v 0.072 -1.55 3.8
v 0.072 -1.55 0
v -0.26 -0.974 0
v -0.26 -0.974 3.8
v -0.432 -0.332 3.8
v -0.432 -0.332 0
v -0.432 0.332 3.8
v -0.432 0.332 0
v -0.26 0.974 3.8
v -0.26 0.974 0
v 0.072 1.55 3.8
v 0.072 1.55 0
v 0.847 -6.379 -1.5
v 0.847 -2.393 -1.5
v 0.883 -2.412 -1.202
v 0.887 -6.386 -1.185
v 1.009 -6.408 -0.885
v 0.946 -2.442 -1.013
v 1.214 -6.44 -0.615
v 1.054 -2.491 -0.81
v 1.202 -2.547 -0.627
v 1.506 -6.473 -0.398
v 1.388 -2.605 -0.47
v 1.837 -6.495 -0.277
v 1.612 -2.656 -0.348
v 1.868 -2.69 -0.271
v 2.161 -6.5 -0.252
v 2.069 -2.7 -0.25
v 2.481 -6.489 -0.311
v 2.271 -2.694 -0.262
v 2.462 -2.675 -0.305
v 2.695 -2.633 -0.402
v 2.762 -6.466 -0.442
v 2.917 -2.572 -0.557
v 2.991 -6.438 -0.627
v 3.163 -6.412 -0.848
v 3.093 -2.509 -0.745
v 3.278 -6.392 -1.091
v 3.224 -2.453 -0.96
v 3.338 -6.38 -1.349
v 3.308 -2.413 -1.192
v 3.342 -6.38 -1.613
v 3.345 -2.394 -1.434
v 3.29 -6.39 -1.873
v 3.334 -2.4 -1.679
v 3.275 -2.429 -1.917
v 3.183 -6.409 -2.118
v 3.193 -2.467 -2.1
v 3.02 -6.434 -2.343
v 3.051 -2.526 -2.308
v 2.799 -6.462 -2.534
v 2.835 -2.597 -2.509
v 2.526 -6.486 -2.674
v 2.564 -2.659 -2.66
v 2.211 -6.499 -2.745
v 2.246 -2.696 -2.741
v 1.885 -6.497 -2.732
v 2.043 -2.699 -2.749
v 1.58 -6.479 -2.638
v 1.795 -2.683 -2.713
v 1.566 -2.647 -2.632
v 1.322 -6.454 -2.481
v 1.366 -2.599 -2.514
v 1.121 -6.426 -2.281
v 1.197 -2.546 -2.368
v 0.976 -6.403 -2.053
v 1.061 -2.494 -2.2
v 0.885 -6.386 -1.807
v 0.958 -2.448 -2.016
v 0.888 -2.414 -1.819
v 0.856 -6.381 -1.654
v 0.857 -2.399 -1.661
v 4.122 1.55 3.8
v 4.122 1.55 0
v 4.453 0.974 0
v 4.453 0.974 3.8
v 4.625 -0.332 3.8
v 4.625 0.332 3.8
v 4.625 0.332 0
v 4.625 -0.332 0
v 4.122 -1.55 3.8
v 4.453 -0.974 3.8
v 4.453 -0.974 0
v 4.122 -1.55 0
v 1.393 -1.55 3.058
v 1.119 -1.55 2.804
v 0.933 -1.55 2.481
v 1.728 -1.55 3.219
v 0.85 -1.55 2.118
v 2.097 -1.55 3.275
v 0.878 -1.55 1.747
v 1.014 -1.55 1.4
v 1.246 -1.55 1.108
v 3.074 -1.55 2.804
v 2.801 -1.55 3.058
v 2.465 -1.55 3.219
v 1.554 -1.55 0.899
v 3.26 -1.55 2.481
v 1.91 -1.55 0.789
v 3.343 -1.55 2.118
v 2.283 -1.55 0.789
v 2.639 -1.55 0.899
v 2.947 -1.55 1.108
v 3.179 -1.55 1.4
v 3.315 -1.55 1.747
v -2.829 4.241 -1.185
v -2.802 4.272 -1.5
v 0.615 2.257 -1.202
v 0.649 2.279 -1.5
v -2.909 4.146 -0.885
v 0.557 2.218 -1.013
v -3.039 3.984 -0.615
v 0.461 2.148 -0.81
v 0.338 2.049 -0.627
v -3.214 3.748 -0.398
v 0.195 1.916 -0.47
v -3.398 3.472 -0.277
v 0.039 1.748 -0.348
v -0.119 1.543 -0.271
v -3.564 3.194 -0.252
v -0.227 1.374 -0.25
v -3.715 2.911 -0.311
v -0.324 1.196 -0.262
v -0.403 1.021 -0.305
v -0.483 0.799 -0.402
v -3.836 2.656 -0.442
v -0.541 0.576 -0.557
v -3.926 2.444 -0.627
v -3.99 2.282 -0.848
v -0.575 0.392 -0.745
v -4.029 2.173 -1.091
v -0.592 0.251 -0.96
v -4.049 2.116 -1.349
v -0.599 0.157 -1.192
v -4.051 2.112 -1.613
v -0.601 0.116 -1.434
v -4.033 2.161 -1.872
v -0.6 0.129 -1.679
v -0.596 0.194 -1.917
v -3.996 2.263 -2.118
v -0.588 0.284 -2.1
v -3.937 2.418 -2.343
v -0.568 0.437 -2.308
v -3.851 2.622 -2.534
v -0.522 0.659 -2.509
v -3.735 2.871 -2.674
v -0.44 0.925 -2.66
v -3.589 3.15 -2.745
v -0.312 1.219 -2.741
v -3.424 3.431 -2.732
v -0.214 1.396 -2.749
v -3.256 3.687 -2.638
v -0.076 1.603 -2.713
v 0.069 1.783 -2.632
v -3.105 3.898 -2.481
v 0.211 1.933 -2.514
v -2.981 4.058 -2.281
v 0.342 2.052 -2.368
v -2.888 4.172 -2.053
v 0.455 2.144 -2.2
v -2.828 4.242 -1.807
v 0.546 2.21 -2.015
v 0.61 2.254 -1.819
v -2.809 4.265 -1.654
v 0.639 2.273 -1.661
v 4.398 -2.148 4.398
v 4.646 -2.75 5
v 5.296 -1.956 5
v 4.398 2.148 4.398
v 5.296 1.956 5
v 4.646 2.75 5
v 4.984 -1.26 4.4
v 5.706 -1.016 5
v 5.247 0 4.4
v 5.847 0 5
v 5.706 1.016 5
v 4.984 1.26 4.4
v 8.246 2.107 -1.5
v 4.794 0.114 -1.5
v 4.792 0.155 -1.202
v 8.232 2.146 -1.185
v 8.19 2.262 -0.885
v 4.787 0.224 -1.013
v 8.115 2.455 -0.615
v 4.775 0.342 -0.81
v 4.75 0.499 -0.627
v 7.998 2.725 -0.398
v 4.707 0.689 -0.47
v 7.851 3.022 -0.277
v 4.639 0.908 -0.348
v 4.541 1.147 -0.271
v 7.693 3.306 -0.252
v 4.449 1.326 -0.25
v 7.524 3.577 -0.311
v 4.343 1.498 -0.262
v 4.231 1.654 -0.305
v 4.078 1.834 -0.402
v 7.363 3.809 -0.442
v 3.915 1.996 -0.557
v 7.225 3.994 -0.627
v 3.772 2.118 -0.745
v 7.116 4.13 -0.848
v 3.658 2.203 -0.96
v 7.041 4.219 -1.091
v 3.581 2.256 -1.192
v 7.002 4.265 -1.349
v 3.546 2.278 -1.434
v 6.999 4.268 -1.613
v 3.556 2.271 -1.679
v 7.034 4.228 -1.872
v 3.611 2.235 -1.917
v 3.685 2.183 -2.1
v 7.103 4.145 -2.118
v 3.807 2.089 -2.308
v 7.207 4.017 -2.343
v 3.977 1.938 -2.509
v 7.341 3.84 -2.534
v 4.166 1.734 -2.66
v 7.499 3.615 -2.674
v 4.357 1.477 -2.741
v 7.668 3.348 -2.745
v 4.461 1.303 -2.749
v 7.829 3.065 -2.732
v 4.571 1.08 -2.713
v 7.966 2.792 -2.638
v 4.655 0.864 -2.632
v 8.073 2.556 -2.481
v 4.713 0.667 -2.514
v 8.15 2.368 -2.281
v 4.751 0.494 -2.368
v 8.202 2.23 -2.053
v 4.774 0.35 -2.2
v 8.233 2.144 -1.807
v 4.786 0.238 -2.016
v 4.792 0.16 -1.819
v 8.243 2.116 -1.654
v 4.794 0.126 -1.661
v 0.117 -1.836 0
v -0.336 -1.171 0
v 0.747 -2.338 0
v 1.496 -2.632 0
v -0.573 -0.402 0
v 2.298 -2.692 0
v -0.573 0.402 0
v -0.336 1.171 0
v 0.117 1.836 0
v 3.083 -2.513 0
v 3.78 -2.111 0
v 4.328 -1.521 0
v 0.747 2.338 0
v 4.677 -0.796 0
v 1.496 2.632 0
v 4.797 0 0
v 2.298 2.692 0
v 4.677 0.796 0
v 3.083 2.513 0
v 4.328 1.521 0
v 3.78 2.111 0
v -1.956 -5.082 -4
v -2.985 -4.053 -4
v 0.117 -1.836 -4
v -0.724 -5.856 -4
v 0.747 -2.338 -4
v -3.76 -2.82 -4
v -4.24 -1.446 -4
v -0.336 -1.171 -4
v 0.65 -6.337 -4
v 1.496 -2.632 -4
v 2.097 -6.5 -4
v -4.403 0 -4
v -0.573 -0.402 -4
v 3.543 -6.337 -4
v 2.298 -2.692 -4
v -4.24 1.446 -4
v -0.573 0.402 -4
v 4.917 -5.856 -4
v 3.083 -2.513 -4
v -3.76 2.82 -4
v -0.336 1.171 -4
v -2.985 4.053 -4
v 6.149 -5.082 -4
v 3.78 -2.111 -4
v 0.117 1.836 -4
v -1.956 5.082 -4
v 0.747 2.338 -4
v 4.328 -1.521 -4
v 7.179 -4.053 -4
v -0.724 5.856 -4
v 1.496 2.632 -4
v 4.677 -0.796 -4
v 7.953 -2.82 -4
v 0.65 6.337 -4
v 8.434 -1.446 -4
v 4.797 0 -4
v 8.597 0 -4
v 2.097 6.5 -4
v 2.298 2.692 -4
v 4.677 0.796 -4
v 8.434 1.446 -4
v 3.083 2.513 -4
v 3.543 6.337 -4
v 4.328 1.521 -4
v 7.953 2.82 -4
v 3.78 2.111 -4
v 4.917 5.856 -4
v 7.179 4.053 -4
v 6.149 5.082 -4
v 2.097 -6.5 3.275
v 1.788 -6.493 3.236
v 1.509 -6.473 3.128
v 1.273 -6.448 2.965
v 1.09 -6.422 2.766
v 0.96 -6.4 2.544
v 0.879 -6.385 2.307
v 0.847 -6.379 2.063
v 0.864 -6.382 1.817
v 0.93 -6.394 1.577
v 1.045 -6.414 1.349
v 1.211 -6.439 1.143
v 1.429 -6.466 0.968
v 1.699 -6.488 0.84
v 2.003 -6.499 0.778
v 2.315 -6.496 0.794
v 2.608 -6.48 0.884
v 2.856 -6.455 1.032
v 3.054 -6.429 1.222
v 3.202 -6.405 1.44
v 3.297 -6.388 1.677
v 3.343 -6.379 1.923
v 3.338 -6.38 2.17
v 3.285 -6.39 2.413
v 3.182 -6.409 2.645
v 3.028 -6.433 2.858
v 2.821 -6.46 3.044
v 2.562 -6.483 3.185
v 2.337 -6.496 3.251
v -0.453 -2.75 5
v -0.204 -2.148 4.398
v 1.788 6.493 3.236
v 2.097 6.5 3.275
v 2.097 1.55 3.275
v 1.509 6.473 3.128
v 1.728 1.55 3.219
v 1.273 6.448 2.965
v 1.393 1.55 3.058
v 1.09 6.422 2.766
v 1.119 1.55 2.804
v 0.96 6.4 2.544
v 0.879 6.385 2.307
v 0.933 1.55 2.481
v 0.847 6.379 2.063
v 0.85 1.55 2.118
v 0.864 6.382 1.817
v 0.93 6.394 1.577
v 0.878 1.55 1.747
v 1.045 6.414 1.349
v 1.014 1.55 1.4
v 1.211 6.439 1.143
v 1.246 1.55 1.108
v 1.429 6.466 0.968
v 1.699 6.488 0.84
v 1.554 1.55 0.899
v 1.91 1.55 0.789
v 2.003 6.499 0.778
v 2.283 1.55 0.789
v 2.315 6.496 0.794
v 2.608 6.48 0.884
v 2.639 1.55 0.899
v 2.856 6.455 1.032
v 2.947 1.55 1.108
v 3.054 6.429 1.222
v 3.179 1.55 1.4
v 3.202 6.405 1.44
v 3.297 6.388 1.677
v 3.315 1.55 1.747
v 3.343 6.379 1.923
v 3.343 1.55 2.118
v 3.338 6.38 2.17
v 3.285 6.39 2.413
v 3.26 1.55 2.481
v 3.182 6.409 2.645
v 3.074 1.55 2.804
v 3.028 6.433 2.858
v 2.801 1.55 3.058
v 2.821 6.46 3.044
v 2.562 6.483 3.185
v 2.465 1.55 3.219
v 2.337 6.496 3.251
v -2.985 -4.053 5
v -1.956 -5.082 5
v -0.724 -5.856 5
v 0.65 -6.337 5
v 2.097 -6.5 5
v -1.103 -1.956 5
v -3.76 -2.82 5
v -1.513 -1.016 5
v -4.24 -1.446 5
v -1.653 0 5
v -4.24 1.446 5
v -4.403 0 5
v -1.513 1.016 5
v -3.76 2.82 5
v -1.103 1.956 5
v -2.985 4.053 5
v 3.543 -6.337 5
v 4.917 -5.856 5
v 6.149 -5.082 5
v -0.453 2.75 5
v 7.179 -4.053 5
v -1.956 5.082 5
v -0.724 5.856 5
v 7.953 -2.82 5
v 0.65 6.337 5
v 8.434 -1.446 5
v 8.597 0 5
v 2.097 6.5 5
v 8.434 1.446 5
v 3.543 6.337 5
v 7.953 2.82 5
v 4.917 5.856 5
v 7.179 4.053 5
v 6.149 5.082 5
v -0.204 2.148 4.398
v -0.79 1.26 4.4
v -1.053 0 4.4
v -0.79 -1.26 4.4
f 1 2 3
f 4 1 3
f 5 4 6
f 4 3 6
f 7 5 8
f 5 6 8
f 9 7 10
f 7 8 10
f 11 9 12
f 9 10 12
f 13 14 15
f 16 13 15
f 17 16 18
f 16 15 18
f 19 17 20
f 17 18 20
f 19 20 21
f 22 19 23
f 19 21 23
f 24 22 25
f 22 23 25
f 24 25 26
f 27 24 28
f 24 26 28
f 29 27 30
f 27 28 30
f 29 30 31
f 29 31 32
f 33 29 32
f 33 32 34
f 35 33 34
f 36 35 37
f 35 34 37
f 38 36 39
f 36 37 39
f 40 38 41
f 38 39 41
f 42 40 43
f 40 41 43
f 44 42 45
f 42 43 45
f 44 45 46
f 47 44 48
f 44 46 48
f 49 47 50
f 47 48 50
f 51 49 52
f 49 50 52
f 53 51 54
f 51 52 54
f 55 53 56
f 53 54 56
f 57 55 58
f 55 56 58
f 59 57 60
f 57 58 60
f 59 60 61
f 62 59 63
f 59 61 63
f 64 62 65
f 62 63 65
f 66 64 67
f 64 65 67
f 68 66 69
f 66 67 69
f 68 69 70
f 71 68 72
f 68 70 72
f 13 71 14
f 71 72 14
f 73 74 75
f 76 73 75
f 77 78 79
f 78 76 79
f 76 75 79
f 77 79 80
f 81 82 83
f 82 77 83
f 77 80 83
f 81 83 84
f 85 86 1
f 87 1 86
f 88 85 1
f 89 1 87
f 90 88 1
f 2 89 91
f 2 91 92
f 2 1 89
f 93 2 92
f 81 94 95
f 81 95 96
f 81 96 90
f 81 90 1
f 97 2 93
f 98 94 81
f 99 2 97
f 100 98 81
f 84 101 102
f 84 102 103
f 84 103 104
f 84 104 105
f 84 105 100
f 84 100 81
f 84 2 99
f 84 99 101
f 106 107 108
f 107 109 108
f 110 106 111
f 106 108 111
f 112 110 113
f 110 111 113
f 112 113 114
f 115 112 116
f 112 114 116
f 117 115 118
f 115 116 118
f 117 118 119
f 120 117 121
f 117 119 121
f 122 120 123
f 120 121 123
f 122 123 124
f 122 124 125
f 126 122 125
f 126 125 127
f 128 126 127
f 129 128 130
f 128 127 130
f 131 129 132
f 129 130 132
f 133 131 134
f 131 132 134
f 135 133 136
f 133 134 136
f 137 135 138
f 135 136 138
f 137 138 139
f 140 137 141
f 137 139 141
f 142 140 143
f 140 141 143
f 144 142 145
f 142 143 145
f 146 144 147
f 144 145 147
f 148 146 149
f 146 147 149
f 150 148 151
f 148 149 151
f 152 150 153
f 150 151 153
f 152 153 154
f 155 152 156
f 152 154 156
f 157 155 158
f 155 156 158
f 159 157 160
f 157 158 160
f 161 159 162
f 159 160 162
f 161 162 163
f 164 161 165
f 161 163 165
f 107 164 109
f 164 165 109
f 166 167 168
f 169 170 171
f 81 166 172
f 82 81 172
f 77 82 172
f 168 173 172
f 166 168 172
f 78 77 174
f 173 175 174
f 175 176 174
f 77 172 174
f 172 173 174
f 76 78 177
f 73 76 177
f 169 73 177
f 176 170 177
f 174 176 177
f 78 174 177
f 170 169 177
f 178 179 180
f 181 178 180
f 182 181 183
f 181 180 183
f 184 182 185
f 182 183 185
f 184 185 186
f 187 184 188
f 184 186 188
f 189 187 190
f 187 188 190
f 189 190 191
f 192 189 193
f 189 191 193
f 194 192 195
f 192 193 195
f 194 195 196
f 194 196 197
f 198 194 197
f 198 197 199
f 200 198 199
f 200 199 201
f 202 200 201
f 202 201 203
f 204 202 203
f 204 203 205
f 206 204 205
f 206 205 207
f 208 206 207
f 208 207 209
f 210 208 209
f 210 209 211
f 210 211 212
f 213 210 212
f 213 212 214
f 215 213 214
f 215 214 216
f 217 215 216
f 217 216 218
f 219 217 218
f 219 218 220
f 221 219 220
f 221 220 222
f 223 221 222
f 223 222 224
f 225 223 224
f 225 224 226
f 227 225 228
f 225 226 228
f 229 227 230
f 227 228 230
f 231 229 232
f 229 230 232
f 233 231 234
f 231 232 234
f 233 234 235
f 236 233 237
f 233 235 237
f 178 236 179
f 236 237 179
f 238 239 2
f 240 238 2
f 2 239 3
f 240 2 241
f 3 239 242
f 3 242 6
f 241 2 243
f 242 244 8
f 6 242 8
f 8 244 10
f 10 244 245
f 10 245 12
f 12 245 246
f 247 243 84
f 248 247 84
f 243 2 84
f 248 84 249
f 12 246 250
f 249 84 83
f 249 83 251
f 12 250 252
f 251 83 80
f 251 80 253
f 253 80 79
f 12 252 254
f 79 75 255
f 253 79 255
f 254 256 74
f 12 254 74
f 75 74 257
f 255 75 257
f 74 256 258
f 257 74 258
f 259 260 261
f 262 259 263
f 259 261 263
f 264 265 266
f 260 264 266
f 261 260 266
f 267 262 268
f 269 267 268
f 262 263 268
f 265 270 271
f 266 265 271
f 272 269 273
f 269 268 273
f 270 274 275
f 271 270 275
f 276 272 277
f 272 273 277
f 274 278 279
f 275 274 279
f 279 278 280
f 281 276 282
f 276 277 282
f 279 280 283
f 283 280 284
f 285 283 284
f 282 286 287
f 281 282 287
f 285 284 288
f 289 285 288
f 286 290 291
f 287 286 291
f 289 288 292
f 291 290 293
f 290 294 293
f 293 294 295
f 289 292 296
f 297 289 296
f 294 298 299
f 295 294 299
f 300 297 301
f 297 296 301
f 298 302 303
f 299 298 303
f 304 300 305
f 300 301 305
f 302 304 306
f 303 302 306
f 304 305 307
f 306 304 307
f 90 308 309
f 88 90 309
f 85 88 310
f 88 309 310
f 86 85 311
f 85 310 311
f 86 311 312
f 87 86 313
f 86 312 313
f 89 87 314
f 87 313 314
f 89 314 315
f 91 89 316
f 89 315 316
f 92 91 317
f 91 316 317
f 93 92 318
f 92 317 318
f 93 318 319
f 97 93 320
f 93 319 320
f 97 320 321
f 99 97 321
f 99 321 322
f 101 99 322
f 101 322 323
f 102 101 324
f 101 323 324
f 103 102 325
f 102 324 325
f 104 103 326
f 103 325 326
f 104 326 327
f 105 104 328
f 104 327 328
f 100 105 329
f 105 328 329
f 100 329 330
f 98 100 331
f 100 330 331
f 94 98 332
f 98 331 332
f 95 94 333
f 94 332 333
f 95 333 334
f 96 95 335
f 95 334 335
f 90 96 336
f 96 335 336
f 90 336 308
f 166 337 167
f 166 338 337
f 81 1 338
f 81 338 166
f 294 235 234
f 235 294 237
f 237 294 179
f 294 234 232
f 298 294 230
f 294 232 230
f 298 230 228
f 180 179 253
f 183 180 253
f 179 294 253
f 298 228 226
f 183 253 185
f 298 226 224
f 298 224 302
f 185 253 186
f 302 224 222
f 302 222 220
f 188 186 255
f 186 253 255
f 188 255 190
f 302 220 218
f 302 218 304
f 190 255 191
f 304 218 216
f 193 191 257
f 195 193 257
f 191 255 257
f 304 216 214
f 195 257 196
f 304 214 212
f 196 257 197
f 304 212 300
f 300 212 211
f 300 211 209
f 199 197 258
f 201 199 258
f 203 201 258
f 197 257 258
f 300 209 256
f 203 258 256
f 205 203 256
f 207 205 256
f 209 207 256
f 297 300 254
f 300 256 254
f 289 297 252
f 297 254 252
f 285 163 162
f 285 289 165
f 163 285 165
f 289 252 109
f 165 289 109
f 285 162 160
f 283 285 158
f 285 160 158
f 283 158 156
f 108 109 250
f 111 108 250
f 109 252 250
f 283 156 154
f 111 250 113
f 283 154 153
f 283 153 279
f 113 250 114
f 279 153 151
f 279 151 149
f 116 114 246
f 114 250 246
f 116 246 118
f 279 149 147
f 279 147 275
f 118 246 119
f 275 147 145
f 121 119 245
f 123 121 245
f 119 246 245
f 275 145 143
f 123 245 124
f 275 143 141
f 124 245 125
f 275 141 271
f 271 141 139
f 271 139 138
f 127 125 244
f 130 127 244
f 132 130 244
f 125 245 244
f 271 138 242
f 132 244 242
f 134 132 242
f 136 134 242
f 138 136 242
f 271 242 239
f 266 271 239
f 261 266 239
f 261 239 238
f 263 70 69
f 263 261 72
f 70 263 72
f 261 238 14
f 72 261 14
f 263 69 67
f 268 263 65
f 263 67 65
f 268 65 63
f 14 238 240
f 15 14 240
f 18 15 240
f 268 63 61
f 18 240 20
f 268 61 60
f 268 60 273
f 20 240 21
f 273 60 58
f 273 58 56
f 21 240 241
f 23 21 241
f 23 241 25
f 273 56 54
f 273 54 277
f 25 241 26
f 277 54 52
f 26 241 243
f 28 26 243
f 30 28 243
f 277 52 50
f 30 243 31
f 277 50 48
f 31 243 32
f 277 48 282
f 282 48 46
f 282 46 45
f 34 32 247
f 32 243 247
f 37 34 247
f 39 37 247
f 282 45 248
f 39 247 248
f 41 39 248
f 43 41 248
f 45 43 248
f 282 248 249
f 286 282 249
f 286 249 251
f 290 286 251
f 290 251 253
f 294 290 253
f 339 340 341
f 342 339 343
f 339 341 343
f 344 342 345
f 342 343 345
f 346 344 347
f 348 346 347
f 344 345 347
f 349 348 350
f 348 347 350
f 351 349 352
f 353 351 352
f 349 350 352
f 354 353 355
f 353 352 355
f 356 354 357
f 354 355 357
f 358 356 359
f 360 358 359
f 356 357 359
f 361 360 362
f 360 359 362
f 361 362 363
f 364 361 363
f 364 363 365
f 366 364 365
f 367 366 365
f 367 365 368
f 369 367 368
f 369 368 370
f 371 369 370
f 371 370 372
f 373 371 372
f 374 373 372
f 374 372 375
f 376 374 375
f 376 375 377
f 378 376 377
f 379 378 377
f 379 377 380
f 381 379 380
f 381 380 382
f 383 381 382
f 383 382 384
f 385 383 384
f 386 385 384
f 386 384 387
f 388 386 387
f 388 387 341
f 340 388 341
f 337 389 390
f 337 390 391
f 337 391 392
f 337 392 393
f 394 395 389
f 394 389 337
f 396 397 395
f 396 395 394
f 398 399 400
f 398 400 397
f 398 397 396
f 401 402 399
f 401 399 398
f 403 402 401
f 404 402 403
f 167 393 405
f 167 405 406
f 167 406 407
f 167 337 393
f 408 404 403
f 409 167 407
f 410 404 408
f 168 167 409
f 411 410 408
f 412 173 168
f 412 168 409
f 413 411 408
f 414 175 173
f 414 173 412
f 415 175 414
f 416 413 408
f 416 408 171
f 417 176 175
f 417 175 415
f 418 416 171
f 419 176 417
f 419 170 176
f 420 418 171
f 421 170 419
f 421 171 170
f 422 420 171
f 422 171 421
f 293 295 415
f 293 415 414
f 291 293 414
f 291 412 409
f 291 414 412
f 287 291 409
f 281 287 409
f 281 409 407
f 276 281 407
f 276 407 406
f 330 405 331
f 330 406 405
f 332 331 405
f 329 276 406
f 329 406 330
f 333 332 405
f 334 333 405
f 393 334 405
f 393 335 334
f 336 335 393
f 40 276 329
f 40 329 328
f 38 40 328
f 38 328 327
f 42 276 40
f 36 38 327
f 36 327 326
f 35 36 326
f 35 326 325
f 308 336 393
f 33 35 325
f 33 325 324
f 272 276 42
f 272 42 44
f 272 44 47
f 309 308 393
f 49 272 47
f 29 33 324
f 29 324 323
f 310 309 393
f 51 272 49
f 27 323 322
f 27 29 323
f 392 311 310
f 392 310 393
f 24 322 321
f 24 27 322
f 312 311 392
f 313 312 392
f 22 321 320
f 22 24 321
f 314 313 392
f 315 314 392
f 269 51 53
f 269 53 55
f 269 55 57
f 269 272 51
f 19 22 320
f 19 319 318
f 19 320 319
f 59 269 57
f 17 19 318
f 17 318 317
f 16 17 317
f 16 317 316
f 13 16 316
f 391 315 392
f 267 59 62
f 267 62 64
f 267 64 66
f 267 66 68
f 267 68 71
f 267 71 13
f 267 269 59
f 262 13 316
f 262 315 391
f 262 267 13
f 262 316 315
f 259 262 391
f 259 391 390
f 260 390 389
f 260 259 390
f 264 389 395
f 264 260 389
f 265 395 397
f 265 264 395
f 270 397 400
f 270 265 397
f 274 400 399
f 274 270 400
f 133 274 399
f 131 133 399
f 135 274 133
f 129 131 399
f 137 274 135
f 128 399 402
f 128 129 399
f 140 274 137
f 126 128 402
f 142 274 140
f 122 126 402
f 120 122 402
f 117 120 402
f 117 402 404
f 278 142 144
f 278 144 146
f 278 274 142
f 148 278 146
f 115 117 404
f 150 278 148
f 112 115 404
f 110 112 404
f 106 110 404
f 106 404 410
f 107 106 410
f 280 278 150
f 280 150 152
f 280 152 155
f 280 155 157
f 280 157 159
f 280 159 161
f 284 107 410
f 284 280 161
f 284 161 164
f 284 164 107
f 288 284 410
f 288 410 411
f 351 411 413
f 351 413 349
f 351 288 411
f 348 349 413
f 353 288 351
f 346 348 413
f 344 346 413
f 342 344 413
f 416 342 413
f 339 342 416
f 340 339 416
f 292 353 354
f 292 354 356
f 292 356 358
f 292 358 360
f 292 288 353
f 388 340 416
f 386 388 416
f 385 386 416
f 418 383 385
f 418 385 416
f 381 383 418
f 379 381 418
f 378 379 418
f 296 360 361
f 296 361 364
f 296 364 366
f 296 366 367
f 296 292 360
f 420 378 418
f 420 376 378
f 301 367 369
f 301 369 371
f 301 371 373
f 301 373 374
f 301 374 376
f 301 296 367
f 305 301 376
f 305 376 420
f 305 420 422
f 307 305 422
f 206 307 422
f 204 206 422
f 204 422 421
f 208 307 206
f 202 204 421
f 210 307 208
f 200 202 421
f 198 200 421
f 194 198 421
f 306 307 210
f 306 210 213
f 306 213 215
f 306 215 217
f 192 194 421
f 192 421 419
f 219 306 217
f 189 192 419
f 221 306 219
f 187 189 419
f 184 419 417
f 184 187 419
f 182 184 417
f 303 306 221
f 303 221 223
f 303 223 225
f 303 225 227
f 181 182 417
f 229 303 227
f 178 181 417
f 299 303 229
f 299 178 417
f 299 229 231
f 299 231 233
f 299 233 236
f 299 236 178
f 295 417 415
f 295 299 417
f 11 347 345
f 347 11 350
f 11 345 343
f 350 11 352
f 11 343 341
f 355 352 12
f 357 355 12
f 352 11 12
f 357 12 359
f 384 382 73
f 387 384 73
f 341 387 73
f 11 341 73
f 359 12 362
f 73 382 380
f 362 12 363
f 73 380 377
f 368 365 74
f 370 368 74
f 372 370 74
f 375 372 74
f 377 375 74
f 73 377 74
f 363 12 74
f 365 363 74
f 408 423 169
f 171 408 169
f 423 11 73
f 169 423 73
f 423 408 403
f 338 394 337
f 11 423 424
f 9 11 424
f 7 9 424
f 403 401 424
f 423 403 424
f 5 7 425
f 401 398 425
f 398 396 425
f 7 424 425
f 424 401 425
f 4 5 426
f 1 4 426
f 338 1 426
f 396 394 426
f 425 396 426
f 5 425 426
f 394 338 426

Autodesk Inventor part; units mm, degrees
ref_plane "YZ Plane" through (0, 0, 0) normal (1, 0, 0) x (0, 1, 0)
ref_plane "XZ Plane" through (0, 0, 0) normal (0, 1, 0) x (-1, 0, 0)
sketch "Sketch1" plane through (0, 0, 0) normal (0, 0, 1) x (1, 0, 0)
  line L0 (0.8467, -0.7217) -> (0.8467, 0.7217) construction
  line L1 (0.8467, 0.7217) -> (2.0967, 1.4434) construction
  line L2 (2.0967, 1.4434) -> (3.3467, 0.7217) construction
  line L3 (3.3467, 0.7217) -> (3.3467, -0.7217) construction
  line L4 (3.3467, -0.7217) -> (2.0967, -1.4434) construction
  line L5 (2.0967, -1.4434) -> (0.8467, -0.7217) construction
  circle A0 centre (2.0967, 0) radius 2.45 construction
  line L6 (4.8467, -1.5877) -> (3.4717, -2.3816) construction
  line L7 (15.0967, 3) -> (15.0967, -3) construction
  line L8 (-10.9033, 3) -> (-10.9033, -3) construction
  line L9 (-0.6533, 0) -> (-0.6533, 1.5877) construction
  circle A1 centre (2.0967, 0) radius 5
  circle A2 centre (2.0967, 0) radius 1.7 projected
  line L10 (-10.9033, -3) -> (15.0967, -3) projected
  line L11 (-10.9033, 3) -> (15.0967, 3) projected
  circle A3 centre (2.0967, 0) radius 2.7
  circle A4 centre (2.0967, 0) radius 6.5
  circle A5 centre (2.0967, 0) radius 2.75
  point P0 (0.4719, -0.5)
  point P1 (3.7215, -0.5)
  dimension "d10" = 5.4
  dimension "d13" = 13
ref_plane "Work Plane1" through (-20.8033, -6.3, -5.9) normal (0, 0, 1) x (1, 0, 0)
extrude "Extrusion1" add sketch "Sketch1" against normal blind 4 contours A1 L10 L11 | A1 L11 A4 L10 | L11 A1 | A1 L11 A4 | L10 A4 A1 | A1 L10 | A1 L10 A4 L11 | A5
sketch "Sketch2" plane through (2.0967, 0, 0) normal (0, 0, 1) x (1, 0, 0)
  line L0 (-2, 1.5) -> (2, 1.5) construction
  arc A0 (2.5, 0) -> (2, 1.5) centre (0, 0) ccw construction
  arc A1 (-2, 1.5) -> (-2.5, 0) centre (0, 0) ccw construction
  line L1 (2, -1.5) -> (-2, -1.5) construction
  arc A2 (-2.5, 0) -> (2.5, 0) centre (0, 0) ccw construction
  line L2 (2.0248, 1.55) -> (-2.0248, 1.55) construction
  arc A3 (-2.0248, 1.55) -> (-2.55, 0) centre (0, 0) ccw construction
  arc A4 (-2.55, 0) -> (2.55, 0) centre (0, 0) ccw construction
  arc A5 (2.55, 0) -> (2.0248, 1.55) centre (0, 0) ccw construction
  line L3 (-2.0248, 1.55) -> (2.0248, 1.55) construction
  line L4 (-2.0248, 1.55) -> (2.0248, 1.55)
  line L5 (-2.0248, -1.55) -> (2.0248, -1.55)
  arc A6 (-2.0248, 1.55) -> (-2.0248, -1.55) centre (0, 0) ccw
  arc A7 (2.0248, -1.55) -> (2.0248, 1.55) centre (0, 0) ccw
  circle A8 centre (0, 0) radius 6.5 projected
  point P0 (-2.0967, 0)
  dimension "d11" = 3.1
  dimension "d12" = 2.55
extrude "Extrusion2" add sketch "Sketch2" along normal blind 5
chamfer "Chamfer1" distance 1.2 angle 45 4 edges at (2.0967, 1.55, 5) (-0.4533, 0, 5) (2.0967, -1.55, 5) (4.6467, 0, 5)
sketch "Sketch3" plane through (0, 0, 0) normal (0, 1, 0) x (-1, 0, 0)
  line L0 (-4.6467, 0) -> (-4.6467, 3.8) projected
  line L1 (0.4533, 0) -> (0.4533, 3.8) projected
  line L2 (-8.5967, -4) -> (4.4033, -4) projected
  circle A0 centre (-2.0967, -1.5) radius 1.25
  line L3 (-8.5967, -4) -> (4.4033, -4) projected
  point P0 (0, 0)
  point P1 (-8.5967, 0)
  point P2 (4.4033, 0)
  dimension "d14" = 2.5
  dimension "d15" = 2.5
extrude "Extrusion3" cut sketch "Sketch3" against normal blind 10
pattern_circular "Circular Pattern1" count 3 over 360 about axis through (2.0967, 0, 0) along (0, 0, -1) of "Extrusion3"
sketch "Sketch4" plane through (0.0718, -1.55, 0) normal (0, 1, 0) x (1, 0, 0)
  line L0 (0, -3.8) -> (4.0497, -3.8) projected
  line L1 (-4.4752, -5) -> (8.5248, -5) projected
  line L2 (8.5248, 4) -> (-4.4752, 4) projected
  line L3 (4.0497, -3.8) -> (0, -3.8) projected
  line L4 (4.0497, 0) -> (4.0497, -3.8) projected
  line L5 (0, 0) -> (4.0497, 0) projected
  line L6 (0, 0) -> (0, -3.8) projected
  circle A0 centre (2.0248, -2.0248) radius 2.0248
  point P0 (-0.0718, 0)
  point P1 (8.1739, 1.5)
  point P2 (-2.8742, 1.5)
  point P3 (0.7748, 1.5)
hole "Hole1" at (2.0967, -1.55, 2.0248) direction (0, -1, 0) diameter 2.5 end through all both
properties part number "30_Coupling_Screw_28BYJ_M3"
